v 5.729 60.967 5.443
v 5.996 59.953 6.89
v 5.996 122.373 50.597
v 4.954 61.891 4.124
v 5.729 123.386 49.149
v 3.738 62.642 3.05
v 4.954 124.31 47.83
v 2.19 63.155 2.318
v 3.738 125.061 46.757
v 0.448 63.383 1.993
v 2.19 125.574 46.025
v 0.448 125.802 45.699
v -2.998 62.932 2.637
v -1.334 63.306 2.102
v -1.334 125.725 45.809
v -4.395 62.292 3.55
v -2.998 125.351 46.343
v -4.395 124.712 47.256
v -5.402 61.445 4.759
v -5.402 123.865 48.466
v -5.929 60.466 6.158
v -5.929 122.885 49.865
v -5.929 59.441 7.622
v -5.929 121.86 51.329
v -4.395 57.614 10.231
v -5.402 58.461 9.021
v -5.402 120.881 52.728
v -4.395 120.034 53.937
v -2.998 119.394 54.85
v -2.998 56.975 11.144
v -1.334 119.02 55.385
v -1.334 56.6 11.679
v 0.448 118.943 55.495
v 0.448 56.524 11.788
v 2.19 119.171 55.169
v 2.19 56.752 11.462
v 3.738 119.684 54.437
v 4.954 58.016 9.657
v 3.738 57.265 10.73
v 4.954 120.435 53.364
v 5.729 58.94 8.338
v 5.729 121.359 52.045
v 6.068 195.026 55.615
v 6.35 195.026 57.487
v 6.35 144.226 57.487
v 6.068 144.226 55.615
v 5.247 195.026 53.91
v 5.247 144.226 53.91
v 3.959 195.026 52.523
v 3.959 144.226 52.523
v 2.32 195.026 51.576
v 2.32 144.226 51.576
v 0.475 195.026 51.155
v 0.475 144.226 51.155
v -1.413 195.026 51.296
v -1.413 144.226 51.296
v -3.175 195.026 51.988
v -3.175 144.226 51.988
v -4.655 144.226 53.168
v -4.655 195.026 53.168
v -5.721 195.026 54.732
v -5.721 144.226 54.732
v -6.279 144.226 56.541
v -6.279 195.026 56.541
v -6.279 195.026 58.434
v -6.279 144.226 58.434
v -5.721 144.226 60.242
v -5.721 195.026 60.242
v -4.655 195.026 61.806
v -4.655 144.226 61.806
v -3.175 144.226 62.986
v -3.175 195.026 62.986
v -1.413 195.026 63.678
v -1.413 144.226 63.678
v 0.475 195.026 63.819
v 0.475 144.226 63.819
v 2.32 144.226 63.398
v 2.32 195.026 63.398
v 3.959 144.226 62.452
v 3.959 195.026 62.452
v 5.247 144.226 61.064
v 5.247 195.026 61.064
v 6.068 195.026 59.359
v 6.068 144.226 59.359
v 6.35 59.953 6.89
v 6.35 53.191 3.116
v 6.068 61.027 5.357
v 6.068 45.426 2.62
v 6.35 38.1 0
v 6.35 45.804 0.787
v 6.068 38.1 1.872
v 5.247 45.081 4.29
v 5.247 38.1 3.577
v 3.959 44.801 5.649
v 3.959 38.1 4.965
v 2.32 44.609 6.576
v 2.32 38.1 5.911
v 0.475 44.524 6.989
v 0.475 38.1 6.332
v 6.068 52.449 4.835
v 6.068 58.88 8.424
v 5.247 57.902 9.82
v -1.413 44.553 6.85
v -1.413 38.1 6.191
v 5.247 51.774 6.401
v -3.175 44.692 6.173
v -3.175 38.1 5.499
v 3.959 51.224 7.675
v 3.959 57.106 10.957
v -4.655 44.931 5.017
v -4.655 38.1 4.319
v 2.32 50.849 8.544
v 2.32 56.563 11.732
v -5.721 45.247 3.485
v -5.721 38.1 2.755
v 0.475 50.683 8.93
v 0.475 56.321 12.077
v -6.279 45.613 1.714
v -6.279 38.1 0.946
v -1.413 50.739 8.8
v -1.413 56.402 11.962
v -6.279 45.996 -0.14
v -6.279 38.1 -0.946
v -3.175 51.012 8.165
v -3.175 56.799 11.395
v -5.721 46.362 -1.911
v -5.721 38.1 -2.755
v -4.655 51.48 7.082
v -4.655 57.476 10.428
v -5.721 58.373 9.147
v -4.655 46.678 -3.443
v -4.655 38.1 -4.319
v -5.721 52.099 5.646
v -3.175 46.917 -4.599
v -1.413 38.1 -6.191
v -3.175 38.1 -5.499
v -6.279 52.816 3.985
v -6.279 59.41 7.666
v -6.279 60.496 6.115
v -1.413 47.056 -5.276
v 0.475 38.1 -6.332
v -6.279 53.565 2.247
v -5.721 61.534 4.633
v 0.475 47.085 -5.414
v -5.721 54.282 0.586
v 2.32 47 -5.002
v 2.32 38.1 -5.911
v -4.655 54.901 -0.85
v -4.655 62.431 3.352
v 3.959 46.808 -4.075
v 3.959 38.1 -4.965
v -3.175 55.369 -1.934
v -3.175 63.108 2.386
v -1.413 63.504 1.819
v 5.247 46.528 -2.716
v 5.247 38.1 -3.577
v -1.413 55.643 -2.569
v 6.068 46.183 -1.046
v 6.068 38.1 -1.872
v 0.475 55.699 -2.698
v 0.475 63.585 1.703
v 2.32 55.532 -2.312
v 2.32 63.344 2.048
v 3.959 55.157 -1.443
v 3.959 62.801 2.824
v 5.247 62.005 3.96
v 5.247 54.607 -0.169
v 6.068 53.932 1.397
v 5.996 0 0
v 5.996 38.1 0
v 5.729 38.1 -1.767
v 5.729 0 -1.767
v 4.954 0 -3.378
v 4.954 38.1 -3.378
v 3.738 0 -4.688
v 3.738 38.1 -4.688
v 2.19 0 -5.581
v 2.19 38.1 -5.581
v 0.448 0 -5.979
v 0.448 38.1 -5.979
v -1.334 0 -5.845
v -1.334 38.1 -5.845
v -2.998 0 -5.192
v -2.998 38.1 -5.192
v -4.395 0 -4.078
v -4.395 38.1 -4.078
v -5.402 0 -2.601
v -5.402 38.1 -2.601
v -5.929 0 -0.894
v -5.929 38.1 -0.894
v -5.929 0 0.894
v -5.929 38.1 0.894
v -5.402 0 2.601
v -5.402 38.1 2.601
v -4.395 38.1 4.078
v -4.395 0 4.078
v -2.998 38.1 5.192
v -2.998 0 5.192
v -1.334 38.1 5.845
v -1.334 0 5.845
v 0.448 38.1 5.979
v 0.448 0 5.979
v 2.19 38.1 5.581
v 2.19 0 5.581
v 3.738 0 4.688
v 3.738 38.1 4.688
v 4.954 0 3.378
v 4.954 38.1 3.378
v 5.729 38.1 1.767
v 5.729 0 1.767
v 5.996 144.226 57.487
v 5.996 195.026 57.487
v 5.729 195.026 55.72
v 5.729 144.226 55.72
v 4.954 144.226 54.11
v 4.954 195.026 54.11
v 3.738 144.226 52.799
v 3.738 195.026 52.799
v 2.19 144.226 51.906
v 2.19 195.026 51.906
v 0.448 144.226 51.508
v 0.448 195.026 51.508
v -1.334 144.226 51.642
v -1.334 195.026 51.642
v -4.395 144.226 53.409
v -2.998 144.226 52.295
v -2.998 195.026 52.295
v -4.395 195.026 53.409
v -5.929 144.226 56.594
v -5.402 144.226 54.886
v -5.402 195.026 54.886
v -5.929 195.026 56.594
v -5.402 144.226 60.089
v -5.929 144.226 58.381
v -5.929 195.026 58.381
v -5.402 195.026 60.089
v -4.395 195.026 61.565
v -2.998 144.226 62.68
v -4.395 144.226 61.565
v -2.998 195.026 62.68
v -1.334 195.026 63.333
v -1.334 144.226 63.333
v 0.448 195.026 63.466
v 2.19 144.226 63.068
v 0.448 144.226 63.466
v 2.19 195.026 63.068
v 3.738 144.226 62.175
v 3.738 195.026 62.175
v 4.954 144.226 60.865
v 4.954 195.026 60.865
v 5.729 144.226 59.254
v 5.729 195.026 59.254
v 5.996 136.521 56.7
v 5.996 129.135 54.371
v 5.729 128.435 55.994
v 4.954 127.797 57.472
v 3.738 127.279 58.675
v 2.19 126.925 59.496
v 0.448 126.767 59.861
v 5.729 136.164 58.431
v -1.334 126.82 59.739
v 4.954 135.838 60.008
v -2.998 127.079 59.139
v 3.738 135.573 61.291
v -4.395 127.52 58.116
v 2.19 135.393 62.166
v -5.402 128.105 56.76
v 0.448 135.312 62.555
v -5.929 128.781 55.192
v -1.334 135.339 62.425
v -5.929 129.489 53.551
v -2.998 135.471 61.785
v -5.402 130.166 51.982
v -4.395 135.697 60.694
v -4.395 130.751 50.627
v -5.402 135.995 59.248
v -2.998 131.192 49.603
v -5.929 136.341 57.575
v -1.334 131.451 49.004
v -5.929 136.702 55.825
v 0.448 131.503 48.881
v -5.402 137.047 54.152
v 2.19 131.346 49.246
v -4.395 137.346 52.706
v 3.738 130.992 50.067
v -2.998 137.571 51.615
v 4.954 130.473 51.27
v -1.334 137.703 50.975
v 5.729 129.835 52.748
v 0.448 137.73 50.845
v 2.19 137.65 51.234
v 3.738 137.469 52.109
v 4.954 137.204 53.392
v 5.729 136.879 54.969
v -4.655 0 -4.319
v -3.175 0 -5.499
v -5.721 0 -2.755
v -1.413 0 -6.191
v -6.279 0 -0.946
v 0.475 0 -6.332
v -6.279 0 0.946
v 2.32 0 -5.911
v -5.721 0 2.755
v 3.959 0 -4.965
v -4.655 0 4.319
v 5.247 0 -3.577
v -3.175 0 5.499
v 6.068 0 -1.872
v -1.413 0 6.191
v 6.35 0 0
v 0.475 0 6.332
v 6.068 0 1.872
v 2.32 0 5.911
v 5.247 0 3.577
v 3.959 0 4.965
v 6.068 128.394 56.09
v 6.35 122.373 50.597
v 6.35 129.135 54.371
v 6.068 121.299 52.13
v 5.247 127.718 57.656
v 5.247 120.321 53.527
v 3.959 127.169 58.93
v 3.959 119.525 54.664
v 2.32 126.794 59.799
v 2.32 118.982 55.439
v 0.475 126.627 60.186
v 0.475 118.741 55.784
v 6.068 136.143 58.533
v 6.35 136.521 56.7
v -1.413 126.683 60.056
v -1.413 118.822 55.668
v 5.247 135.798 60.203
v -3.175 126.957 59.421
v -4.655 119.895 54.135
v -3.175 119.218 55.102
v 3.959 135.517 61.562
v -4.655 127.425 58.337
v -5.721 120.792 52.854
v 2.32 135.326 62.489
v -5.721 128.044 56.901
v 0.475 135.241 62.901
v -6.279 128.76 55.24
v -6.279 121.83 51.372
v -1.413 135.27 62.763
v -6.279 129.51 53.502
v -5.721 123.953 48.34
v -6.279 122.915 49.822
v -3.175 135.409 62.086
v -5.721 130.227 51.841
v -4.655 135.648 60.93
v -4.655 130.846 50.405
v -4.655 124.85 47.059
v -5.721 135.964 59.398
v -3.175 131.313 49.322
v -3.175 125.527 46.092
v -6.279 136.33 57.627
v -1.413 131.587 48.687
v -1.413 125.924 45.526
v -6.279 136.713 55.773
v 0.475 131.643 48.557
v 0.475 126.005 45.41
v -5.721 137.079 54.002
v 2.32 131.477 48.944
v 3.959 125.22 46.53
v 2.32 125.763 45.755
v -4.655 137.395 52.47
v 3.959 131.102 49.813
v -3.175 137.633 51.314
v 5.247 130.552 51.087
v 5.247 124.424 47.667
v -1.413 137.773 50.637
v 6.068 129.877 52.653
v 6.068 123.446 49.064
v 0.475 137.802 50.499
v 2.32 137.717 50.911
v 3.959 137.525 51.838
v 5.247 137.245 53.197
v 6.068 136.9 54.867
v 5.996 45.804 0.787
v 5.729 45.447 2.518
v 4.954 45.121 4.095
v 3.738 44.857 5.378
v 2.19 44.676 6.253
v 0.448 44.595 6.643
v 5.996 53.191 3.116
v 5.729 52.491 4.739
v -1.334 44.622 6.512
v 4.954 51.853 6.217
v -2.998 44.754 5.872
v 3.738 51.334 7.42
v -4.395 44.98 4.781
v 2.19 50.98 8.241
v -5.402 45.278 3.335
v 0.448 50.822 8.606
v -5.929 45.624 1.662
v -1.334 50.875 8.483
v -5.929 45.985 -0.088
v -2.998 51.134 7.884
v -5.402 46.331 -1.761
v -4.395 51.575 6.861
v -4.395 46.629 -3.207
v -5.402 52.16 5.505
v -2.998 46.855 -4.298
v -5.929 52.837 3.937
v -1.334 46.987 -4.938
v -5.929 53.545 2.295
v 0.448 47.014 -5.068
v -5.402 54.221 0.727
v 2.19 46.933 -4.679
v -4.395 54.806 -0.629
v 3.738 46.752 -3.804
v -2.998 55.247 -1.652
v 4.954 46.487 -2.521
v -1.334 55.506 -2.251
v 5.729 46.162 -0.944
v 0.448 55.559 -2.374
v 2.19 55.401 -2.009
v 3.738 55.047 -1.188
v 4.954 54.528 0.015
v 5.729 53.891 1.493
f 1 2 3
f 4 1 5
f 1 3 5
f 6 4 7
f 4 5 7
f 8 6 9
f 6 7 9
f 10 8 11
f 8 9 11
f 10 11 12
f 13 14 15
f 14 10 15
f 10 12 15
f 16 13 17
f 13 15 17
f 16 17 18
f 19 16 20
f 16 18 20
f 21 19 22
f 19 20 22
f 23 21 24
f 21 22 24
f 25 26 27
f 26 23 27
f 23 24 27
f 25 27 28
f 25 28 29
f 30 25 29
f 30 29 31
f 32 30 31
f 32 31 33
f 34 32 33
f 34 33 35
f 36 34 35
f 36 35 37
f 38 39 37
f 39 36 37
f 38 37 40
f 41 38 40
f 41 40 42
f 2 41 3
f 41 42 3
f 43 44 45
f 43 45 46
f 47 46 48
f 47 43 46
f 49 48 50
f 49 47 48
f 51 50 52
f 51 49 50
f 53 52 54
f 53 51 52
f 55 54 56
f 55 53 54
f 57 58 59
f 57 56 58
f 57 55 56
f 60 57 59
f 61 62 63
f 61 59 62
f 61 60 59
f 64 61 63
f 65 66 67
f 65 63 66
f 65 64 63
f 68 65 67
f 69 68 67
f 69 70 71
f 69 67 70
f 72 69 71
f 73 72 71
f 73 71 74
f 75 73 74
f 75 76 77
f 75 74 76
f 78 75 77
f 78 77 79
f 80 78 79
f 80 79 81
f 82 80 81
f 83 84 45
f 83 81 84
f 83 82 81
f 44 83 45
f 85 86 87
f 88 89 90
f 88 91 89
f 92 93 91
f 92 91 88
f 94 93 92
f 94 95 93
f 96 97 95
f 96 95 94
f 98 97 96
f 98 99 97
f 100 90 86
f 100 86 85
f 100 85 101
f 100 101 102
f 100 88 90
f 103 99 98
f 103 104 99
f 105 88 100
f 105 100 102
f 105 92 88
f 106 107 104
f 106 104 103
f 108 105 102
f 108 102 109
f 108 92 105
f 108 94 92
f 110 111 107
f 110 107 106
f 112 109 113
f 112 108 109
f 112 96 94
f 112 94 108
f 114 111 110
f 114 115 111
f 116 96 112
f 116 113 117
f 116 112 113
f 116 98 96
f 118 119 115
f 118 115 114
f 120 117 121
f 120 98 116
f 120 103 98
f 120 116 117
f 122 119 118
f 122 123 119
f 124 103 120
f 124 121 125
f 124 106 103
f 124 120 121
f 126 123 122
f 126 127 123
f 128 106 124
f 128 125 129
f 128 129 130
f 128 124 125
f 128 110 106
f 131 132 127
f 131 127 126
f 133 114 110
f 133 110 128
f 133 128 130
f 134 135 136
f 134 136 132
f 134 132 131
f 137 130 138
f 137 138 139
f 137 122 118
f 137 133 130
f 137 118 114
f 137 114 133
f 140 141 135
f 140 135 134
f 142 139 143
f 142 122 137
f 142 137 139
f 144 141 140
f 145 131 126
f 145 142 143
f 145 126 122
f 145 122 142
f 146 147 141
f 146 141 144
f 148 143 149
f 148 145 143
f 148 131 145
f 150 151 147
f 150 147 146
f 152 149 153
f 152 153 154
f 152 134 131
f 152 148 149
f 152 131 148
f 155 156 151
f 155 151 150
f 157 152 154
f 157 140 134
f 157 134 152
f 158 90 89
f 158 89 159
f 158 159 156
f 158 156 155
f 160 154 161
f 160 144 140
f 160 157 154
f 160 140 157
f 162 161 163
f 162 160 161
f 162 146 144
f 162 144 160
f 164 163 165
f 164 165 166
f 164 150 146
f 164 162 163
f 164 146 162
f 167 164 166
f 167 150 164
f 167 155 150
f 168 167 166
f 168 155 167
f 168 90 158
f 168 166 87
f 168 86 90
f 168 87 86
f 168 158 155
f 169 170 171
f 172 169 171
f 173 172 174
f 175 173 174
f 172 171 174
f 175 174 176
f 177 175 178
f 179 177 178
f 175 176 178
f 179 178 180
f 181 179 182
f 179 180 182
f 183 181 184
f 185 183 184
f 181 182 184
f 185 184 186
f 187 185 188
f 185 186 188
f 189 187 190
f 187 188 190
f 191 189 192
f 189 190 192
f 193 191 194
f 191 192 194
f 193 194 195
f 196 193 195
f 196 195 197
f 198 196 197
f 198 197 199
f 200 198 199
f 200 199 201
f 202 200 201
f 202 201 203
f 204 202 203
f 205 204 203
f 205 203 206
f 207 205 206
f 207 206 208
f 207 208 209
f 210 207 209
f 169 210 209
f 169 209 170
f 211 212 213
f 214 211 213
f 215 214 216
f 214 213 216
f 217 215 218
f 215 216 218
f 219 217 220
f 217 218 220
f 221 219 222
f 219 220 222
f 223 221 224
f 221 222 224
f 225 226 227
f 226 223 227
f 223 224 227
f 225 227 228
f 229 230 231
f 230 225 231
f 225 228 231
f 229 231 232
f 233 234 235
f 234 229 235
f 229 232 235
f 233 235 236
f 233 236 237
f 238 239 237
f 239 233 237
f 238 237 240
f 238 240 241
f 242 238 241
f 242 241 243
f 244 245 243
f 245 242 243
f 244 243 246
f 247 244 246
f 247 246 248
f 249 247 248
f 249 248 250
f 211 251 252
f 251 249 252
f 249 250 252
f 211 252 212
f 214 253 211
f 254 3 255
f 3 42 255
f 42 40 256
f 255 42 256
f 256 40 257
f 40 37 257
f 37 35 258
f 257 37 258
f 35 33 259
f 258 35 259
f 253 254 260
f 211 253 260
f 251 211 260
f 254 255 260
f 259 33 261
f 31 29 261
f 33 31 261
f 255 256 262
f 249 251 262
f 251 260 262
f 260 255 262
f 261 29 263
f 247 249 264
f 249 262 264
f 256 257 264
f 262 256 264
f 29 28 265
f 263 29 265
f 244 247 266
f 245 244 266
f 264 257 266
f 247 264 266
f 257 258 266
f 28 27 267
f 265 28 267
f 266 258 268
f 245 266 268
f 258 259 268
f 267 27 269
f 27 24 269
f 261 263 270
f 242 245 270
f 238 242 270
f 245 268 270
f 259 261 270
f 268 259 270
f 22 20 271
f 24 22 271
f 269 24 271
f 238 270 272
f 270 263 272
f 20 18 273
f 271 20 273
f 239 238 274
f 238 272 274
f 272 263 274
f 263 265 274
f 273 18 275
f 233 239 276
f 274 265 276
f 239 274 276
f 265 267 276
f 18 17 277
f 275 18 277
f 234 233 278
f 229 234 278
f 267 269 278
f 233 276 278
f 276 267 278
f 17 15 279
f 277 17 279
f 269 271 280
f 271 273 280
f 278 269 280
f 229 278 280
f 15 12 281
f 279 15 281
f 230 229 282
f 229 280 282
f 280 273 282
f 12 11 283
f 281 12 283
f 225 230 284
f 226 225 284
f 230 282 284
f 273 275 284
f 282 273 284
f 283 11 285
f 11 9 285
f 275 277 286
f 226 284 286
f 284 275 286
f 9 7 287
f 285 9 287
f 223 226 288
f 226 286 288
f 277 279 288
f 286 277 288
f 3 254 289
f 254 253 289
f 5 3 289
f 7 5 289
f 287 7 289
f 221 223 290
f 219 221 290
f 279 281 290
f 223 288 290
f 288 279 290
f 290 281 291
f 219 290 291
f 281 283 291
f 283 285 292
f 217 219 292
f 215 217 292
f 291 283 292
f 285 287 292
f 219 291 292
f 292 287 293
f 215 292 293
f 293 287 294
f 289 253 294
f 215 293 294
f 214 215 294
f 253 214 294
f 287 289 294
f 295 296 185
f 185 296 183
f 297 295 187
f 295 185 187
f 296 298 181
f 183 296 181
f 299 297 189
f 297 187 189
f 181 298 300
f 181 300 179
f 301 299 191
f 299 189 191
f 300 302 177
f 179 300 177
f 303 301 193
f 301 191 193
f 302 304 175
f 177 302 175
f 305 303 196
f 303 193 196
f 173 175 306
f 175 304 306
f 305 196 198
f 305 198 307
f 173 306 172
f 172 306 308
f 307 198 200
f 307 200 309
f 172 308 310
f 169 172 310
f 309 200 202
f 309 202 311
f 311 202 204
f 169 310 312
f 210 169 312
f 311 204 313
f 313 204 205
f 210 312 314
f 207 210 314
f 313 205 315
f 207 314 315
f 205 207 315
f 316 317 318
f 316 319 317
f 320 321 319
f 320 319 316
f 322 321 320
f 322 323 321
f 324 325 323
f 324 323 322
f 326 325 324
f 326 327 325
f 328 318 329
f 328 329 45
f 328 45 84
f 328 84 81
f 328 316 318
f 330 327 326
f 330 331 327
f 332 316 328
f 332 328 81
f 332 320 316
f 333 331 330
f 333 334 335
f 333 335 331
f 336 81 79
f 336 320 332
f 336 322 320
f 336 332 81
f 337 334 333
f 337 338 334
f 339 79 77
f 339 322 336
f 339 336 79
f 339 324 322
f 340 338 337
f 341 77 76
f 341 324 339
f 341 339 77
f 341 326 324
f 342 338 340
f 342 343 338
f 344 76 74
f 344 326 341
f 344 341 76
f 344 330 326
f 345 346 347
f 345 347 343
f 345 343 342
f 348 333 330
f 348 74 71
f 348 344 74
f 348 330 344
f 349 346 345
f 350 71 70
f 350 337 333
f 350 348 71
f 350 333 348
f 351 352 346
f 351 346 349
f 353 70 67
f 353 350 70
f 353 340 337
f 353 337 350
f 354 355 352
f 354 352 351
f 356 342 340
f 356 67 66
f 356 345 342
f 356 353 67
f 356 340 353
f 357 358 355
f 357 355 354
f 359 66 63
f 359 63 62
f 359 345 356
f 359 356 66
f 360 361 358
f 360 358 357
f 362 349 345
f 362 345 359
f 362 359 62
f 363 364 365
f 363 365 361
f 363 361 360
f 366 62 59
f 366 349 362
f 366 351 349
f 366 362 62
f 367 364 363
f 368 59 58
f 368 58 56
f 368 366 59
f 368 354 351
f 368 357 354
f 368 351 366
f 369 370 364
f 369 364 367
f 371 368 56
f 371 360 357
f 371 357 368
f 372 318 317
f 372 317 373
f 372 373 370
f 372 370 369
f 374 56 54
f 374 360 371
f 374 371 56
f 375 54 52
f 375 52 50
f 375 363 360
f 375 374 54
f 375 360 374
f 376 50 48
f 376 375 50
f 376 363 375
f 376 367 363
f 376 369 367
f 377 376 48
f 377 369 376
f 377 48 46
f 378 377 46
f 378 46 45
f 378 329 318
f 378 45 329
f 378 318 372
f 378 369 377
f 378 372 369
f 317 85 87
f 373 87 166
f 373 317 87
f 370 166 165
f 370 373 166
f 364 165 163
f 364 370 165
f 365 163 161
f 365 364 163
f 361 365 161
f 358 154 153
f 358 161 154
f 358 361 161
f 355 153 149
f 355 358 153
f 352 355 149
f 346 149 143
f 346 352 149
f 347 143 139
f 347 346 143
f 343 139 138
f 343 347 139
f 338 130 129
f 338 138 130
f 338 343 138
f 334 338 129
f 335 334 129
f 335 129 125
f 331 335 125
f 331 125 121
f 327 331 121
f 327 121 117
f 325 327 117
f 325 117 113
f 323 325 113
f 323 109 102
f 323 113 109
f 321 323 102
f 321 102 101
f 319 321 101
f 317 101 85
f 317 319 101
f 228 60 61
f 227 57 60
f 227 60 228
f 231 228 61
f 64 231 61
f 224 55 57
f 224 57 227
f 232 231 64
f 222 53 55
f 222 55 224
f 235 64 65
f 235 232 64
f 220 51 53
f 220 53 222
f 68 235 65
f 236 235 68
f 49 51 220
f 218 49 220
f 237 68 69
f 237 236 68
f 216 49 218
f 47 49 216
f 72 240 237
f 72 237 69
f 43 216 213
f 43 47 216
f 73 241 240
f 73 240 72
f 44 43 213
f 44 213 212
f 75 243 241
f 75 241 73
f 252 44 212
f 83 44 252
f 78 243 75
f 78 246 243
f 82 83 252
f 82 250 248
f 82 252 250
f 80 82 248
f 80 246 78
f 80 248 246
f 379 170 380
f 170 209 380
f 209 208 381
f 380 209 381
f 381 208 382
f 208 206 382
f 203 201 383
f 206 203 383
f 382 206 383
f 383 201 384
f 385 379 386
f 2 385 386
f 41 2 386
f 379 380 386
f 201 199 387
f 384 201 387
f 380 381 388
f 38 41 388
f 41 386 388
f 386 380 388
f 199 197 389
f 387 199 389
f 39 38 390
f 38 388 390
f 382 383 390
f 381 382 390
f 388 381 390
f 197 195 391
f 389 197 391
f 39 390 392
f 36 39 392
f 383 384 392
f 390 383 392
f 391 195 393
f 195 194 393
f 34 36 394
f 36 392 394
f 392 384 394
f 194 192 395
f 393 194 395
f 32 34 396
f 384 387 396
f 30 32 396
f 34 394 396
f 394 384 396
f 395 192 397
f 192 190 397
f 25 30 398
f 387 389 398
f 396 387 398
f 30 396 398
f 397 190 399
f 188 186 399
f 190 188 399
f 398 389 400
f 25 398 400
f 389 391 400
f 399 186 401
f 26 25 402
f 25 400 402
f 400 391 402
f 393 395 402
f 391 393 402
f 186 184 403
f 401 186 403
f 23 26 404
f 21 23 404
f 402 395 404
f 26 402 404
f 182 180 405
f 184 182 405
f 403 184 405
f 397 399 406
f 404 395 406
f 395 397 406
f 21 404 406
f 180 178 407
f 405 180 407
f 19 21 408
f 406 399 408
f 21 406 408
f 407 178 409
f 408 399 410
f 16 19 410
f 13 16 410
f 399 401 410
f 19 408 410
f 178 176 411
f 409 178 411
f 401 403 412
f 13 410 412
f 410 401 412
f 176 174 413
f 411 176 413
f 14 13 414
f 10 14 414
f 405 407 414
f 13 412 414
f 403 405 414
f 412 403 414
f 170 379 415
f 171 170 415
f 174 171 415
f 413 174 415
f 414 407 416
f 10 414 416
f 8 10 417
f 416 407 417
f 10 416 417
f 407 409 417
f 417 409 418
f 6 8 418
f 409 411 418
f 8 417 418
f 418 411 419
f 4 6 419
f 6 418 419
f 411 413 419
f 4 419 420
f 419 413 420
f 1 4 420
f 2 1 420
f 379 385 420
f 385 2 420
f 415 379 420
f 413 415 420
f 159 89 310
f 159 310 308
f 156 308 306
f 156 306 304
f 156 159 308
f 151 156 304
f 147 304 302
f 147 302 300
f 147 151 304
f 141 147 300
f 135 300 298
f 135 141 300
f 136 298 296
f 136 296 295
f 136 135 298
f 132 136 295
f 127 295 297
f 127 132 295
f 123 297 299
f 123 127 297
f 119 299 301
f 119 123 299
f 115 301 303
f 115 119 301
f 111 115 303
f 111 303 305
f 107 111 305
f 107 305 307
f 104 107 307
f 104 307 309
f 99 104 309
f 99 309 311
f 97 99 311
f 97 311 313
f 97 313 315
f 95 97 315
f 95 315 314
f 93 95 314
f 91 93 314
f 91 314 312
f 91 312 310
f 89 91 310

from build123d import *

# Parameters (mm, degrees)
SKETCH1_R   = 6.35
SKETCH1_R_2 = 5.995762211


with BuildPart() as part:
    # Sweep1: sweep along a path in Sketch2
    with BuildLine(Plane(origin=(0, 0, 0), x_dir=(0, 0, -1), z_dir=(1, 0, 0))) as sweep1_path:
        Line((0, 0), (0, 38.1))
        ThreePointArc((0, 38.1), (-1.763384176, 49.556890961), (-6.890307113, 59.953262225))
        Line((-6.890307113, 59.953262225), (-50.596831563, 122.372648))
        ThreePointArc((-50.596831563, 122.372648), (-55.723754499, 132.769019264), (-57.487138675, 144.225910225))
        Line((-57.487138675, 144.225910225), (-57.487138675, 195.025910225))
    # Sketch1 → Sweep1 (sweep)
    with BuildSketch(Plane(origin=(0, 0, 0), x_dir=(1, 0, 0), z_dir=(0, 1, 0))):
        Circle(SKETCH1_R)
        Circle(SKETCH1_R_2, mode=Mode.SUBTRACT)
    sweep(path=sweep1_path.line)


solid = part.part
